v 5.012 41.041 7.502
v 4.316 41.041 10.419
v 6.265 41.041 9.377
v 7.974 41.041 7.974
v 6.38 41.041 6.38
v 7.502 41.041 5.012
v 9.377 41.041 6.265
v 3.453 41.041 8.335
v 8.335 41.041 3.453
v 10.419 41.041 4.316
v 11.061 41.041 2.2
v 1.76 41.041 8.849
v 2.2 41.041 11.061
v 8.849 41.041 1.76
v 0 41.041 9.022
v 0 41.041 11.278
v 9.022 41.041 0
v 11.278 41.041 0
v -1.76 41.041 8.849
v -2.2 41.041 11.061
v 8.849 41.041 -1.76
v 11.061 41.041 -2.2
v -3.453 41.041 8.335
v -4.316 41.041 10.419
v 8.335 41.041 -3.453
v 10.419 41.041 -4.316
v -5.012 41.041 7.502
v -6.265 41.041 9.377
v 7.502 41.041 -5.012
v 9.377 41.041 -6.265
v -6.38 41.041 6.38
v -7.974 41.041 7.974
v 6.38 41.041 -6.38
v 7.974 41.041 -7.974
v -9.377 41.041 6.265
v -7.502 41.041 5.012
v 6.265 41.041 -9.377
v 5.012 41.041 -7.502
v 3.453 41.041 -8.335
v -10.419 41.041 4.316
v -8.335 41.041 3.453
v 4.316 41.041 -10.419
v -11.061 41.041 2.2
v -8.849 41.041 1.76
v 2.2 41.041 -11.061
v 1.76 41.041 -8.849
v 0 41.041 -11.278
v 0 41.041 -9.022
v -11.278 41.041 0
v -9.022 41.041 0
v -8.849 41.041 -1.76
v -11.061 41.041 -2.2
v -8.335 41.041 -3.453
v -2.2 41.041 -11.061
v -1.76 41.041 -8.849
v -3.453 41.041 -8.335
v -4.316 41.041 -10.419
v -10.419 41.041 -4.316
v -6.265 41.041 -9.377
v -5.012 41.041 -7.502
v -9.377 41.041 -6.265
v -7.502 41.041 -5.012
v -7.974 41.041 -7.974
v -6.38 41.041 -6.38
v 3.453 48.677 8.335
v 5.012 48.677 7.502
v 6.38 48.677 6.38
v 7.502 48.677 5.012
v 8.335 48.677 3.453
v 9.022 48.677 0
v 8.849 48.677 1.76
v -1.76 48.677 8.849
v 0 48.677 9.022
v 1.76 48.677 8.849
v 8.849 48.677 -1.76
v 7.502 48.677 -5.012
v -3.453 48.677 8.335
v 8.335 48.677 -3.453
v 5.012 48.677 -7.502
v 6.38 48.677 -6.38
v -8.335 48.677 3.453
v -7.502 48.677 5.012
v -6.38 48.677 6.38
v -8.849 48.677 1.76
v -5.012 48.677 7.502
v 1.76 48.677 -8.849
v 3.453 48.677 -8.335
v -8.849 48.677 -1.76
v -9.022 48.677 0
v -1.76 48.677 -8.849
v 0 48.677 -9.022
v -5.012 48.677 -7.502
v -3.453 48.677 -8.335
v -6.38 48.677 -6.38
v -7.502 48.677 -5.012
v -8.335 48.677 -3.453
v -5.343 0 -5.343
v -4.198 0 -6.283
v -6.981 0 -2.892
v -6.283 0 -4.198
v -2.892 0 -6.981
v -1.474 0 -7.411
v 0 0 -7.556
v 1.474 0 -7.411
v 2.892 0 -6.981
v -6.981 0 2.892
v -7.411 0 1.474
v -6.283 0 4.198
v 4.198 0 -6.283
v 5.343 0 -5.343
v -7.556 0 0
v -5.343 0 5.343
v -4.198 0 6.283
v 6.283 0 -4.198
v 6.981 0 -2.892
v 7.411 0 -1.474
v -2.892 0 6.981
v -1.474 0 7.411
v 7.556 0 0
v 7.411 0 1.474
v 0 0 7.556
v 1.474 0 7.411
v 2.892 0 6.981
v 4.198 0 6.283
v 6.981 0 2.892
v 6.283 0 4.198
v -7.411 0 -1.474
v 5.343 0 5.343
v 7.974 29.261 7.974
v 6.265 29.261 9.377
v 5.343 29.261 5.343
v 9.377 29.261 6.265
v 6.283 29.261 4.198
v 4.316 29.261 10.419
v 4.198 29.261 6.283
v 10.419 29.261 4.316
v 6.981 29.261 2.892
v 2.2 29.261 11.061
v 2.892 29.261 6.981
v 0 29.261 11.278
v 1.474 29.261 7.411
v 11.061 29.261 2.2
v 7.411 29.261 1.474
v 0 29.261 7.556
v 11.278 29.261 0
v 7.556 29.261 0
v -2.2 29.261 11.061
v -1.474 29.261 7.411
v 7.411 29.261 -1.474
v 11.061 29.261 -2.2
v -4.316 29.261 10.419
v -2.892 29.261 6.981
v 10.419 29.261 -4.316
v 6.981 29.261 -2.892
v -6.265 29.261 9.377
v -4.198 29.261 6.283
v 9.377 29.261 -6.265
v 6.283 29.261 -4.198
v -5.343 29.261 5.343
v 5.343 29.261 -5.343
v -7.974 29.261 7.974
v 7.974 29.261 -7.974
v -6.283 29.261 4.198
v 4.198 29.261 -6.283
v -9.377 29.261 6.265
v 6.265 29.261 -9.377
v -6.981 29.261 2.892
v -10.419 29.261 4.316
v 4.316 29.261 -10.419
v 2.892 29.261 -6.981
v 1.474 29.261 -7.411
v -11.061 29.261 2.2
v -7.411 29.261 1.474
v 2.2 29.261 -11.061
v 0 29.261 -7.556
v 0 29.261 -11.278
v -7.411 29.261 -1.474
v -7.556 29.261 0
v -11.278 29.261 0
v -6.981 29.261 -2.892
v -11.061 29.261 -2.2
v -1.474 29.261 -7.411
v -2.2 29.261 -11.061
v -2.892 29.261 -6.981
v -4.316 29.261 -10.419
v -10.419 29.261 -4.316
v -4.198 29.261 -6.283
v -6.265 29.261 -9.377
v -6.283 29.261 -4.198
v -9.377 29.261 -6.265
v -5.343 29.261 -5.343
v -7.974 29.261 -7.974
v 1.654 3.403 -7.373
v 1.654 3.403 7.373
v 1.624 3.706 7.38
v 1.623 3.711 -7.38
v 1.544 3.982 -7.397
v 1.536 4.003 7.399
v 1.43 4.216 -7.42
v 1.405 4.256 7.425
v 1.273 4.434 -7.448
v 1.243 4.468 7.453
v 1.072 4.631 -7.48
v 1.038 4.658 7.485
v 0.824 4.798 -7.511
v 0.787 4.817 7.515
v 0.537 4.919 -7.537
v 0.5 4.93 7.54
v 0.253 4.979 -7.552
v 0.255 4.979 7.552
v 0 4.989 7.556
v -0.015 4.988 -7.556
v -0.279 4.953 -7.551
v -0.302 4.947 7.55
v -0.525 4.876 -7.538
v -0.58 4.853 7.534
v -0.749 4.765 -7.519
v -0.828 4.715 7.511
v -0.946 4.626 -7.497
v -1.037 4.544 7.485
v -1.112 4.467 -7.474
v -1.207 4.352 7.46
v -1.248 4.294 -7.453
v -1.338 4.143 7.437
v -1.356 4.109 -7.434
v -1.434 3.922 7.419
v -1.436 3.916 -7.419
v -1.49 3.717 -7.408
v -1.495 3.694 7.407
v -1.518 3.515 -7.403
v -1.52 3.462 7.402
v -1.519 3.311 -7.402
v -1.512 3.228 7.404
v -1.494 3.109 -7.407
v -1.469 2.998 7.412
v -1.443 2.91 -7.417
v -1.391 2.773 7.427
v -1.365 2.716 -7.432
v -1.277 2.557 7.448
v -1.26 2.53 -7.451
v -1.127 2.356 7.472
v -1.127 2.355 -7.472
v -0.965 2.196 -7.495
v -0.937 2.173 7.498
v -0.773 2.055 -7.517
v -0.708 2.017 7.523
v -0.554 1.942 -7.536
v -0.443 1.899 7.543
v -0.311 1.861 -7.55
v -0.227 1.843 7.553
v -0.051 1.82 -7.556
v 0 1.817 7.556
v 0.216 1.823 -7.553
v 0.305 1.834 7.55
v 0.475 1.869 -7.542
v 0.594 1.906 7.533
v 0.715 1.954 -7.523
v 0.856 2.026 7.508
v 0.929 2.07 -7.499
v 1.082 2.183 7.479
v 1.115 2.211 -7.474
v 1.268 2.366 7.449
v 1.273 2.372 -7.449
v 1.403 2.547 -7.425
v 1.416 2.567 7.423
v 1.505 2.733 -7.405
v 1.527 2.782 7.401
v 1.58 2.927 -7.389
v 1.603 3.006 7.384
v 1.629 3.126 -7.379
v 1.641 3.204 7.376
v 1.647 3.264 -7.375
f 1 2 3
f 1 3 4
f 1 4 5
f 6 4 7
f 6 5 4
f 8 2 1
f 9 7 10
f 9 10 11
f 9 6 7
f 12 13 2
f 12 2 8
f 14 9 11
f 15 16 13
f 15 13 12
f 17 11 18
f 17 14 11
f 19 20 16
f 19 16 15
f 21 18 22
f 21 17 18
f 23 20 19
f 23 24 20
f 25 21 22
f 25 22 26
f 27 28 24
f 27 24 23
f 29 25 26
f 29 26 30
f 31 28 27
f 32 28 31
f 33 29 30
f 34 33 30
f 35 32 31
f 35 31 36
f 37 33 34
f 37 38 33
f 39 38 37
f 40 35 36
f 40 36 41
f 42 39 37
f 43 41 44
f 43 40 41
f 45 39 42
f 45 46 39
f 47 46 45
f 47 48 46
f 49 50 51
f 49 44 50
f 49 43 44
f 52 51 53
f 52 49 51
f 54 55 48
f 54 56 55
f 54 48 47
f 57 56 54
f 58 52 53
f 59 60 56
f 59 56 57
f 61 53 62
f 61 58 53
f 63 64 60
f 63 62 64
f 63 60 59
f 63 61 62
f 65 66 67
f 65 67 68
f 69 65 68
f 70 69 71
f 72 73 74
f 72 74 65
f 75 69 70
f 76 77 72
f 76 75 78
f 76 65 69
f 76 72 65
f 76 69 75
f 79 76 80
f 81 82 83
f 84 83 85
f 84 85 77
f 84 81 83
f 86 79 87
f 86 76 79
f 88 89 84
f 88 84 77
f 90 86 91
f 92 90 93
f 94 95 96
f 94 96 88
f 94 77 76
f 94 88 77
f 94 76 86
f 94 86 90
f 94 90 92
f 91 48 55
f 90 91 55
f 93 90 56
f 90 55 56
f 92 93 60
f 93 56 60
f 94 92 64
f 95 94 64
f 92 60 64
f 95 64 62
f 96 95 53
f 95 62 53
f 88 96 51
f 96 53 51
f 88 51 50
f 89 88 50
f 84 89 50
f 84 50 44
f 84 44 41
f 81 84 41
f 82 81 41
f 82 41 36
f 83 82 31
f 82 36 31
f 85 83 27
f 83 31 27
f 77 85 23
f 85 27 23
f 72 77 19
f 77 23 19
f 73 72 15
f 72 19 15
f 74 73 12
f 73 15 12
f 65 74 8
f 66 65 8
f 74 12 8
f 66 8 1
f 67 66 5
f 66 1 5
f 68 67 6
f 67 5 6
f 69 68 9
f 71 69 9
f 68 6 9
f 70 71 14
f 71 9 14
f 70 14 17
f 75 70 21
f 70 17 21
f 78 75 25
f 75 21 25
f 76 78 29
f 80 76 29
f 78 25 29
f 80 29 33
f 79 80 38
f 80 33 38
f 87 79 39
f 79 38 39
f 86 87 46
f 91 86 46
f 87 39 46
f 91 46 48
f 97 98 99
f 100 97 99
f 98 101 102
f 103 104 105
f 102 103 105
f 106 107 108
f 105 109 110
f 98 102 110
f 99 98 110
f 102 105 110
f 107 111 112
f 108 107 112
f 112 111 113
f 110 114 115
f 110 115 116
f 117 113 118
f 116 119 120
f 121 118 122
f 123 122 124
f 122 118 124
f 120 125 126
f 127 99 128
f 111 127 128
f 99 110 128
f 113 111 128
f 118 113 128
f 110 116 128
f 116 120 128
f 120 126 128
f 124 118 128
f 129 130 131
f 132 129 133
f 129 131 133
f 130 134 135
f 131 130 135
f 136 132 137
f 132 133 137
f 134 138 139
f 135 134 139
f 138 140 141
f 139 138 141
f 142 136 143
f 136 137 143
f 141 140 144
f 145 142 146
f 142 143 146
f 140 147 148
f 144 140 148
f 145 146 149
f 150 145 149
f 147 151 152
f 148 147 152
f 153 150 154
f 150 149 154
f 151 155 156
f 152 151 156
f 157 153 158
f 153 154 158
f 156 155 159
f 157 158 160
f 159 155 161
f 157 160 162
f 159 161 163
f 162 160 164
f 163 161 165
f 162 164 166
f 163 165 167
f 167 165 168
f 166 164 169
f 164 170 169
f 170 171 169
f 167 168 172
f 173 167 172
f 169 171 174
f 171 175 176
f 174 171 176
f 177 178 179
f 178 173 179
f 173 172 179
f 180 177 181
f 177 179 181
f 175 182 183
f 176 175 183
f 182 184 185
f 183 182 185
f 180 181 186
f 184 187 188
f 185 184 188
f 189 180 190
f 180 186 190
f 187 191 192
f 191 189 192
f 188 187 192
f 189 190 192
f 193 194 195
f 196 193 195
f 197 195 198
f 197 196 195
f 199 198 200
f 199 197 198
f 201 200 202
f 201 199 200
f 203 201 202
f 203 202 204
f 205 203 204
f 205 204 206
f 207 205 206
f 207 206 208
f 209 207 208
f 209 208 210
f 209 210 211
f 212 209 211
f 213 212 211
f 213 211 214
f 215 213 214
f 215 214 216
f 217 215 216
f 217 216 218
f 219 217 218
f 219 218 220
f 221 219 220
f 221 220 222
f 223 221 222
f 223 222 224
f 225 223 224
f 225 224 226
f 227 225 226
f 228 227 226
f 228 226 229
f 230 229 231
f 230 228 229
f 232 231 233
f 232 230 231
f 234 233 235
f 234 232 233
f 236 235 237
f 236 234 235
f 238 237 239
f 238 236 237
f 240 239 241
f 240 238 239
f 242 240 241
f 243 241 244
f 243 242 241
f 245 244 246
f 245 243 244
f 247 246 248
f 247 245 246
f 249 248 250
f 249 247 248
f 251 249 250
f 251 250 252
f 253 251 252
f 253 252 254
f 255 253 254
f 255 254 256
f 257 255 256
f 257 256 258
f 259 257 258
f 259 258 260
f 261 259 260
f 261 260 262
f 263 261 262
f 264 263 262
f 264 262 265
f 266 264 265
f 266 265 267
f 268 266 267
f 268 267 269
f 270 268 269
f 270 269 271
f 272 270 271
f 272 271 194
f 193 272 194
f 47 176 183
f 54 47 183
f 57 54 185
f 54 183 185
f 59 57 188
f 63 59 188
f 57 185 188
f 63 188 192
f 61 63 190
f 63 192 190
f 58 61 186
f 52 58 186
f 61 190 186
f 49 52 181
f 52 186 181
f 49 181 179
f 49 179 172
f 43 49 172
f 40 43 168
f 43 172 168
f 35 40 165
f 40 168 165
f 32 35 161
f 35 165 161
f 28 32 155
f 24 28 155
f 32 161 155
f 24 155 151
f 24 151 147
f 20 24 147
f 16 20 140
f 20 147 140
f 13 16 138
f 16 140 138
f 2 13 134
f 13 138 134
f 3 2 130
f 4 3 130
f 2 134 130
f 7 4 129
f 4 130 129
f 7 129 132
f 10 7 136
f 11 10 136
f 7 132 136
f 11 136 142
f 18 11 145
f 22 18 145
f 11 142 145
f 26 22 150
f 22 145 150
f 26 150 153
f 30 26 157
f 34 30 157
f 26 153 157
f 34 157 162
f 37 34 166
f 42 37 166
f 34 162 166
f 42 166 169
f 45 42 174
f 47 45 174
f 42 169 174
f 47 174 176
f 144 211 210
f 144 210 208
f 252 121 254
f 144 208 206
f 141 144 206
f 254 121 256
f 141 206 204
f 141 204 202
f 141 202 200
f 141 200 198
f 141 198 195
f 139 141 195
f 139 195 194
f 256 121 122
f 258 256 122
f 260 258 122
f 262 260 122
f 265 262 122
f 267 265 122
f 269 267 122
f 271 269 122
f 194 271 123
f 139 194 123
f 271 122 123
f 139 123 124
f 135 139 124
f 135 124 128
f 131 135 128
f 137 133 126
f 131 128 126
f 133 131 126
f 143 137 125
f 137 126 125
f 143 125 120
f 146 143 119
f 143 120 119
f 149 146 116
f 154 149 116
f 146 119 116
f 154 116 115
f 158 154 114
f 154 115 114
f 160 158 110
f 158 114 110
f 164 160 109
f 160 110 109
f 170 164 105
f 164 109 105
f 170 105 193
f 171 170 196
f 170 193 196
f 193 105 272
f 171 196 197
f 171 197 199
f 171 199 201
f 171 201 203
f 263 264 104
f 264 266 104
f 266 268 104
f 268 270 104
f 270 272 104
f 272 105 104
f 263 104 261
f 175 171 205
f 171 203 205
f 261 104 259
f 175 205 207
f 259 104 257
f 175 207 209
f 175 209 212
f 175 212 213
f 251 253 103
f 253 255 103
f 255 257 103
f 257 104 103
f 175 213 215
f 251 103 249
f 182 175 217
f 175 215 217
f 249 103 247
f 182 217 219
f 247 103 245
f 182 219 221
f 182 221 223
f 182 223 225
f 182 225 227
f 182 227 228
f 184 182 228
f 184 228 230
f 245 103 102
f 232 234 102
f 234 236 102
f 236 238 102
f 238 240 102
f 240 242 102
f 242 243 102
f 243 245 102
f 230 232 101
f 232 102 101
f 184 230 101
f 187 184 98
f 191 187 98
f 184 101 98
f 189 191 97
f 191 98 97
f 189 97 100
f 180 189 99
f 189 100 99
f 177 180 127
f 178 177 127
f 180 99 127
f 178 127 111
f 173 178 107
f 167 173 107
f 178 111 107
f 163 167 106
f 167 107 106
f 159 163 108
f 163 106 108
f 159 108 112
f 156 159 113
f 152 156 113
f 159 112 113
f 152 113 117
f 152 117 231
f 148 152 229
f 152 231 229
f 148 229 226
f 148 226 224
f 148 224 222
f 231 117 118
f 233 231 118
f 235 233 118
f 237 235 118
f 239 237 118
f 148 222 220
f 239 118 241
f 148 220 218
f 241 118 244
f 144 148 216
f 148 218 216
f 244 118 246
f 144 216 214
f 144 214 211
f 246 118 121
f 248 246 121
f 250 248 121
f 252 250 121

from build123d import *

# Parameters (mm, degrees)
SKETCH1_R               = 7.5565
BOSS_EXTRUDE1_DEPTH     = 29.2608
SKETCH2_R               = 11.2776
BOSS_EXTRUDE2_DEPTH     = 11.78052
SKETCH3_R               = 9.02208
BOSS_EXTRUDE3_DEPTH     = 7.63524
CUT_EXTRUDE1_DEPTH      = 52.222807586
CUT_EXTRUDE1_DEPTH_BACK = 52.222807586
SKETCH4_R               = 1.5875


with BuildPart() as part:
    # Sketch1 → Boss-Extrude1 (new body)
    with BuildSketch(Plane(origin=(0, 0, 0), x_dir=(1, 0, 0), z_dir=(0, 1, 0))):
        with Locations(Location((0, 0, 0), (0, 0, 270))):
            Circle(SKETCH1_R)
    extrude(amount=BOSS_EXTRUDE1_DEPTH)

    # Sketch2 → Boss-Extrude2 (add)
    with BuildSketch(Plane(origin=(0, 29.2608, 0), x_dir=(1, 0, 0), z_dir=(0, 1, 0))):
        with Locations(Location((0, 0, 0), (0, 0, 90))):
            Circle(SKETCH2_R)
    extrude(amount=BOSS_EXTRUDE2_DEPTH)

    # Sketch3 → Boss-Extrude3 (add)
    with BuildSketch(Plane(origin=(0, 41.04132, 0), x_dir=(1, 0, 0), z_dir=(0, 1, 0))):
        with Locations(Location((0, 0, 0), (0, 0, 90))):
            Circle(SKETCH3_R)
    extrude(amount=BOSS_EXTRUDE3_DEPTH)

    # Sketch4 → Cut-Extrude1 (cut, two sides: drawn at the far end of the back side and taken through both)
    with BuildSketch(Plane.XY.offset(-CUT_EXTRUDE1_DEPTH_BACK)):
        with Locations((0.06604, 3.402959253)):
            Circle(SKETCH4_R)
    extrude(amount=CUT_EXTRUDE1_DEPTH + CUT_EXTRUDE1_DEPTH_BACK, mode=Mode.SUBTRACT)


solid = part.part
